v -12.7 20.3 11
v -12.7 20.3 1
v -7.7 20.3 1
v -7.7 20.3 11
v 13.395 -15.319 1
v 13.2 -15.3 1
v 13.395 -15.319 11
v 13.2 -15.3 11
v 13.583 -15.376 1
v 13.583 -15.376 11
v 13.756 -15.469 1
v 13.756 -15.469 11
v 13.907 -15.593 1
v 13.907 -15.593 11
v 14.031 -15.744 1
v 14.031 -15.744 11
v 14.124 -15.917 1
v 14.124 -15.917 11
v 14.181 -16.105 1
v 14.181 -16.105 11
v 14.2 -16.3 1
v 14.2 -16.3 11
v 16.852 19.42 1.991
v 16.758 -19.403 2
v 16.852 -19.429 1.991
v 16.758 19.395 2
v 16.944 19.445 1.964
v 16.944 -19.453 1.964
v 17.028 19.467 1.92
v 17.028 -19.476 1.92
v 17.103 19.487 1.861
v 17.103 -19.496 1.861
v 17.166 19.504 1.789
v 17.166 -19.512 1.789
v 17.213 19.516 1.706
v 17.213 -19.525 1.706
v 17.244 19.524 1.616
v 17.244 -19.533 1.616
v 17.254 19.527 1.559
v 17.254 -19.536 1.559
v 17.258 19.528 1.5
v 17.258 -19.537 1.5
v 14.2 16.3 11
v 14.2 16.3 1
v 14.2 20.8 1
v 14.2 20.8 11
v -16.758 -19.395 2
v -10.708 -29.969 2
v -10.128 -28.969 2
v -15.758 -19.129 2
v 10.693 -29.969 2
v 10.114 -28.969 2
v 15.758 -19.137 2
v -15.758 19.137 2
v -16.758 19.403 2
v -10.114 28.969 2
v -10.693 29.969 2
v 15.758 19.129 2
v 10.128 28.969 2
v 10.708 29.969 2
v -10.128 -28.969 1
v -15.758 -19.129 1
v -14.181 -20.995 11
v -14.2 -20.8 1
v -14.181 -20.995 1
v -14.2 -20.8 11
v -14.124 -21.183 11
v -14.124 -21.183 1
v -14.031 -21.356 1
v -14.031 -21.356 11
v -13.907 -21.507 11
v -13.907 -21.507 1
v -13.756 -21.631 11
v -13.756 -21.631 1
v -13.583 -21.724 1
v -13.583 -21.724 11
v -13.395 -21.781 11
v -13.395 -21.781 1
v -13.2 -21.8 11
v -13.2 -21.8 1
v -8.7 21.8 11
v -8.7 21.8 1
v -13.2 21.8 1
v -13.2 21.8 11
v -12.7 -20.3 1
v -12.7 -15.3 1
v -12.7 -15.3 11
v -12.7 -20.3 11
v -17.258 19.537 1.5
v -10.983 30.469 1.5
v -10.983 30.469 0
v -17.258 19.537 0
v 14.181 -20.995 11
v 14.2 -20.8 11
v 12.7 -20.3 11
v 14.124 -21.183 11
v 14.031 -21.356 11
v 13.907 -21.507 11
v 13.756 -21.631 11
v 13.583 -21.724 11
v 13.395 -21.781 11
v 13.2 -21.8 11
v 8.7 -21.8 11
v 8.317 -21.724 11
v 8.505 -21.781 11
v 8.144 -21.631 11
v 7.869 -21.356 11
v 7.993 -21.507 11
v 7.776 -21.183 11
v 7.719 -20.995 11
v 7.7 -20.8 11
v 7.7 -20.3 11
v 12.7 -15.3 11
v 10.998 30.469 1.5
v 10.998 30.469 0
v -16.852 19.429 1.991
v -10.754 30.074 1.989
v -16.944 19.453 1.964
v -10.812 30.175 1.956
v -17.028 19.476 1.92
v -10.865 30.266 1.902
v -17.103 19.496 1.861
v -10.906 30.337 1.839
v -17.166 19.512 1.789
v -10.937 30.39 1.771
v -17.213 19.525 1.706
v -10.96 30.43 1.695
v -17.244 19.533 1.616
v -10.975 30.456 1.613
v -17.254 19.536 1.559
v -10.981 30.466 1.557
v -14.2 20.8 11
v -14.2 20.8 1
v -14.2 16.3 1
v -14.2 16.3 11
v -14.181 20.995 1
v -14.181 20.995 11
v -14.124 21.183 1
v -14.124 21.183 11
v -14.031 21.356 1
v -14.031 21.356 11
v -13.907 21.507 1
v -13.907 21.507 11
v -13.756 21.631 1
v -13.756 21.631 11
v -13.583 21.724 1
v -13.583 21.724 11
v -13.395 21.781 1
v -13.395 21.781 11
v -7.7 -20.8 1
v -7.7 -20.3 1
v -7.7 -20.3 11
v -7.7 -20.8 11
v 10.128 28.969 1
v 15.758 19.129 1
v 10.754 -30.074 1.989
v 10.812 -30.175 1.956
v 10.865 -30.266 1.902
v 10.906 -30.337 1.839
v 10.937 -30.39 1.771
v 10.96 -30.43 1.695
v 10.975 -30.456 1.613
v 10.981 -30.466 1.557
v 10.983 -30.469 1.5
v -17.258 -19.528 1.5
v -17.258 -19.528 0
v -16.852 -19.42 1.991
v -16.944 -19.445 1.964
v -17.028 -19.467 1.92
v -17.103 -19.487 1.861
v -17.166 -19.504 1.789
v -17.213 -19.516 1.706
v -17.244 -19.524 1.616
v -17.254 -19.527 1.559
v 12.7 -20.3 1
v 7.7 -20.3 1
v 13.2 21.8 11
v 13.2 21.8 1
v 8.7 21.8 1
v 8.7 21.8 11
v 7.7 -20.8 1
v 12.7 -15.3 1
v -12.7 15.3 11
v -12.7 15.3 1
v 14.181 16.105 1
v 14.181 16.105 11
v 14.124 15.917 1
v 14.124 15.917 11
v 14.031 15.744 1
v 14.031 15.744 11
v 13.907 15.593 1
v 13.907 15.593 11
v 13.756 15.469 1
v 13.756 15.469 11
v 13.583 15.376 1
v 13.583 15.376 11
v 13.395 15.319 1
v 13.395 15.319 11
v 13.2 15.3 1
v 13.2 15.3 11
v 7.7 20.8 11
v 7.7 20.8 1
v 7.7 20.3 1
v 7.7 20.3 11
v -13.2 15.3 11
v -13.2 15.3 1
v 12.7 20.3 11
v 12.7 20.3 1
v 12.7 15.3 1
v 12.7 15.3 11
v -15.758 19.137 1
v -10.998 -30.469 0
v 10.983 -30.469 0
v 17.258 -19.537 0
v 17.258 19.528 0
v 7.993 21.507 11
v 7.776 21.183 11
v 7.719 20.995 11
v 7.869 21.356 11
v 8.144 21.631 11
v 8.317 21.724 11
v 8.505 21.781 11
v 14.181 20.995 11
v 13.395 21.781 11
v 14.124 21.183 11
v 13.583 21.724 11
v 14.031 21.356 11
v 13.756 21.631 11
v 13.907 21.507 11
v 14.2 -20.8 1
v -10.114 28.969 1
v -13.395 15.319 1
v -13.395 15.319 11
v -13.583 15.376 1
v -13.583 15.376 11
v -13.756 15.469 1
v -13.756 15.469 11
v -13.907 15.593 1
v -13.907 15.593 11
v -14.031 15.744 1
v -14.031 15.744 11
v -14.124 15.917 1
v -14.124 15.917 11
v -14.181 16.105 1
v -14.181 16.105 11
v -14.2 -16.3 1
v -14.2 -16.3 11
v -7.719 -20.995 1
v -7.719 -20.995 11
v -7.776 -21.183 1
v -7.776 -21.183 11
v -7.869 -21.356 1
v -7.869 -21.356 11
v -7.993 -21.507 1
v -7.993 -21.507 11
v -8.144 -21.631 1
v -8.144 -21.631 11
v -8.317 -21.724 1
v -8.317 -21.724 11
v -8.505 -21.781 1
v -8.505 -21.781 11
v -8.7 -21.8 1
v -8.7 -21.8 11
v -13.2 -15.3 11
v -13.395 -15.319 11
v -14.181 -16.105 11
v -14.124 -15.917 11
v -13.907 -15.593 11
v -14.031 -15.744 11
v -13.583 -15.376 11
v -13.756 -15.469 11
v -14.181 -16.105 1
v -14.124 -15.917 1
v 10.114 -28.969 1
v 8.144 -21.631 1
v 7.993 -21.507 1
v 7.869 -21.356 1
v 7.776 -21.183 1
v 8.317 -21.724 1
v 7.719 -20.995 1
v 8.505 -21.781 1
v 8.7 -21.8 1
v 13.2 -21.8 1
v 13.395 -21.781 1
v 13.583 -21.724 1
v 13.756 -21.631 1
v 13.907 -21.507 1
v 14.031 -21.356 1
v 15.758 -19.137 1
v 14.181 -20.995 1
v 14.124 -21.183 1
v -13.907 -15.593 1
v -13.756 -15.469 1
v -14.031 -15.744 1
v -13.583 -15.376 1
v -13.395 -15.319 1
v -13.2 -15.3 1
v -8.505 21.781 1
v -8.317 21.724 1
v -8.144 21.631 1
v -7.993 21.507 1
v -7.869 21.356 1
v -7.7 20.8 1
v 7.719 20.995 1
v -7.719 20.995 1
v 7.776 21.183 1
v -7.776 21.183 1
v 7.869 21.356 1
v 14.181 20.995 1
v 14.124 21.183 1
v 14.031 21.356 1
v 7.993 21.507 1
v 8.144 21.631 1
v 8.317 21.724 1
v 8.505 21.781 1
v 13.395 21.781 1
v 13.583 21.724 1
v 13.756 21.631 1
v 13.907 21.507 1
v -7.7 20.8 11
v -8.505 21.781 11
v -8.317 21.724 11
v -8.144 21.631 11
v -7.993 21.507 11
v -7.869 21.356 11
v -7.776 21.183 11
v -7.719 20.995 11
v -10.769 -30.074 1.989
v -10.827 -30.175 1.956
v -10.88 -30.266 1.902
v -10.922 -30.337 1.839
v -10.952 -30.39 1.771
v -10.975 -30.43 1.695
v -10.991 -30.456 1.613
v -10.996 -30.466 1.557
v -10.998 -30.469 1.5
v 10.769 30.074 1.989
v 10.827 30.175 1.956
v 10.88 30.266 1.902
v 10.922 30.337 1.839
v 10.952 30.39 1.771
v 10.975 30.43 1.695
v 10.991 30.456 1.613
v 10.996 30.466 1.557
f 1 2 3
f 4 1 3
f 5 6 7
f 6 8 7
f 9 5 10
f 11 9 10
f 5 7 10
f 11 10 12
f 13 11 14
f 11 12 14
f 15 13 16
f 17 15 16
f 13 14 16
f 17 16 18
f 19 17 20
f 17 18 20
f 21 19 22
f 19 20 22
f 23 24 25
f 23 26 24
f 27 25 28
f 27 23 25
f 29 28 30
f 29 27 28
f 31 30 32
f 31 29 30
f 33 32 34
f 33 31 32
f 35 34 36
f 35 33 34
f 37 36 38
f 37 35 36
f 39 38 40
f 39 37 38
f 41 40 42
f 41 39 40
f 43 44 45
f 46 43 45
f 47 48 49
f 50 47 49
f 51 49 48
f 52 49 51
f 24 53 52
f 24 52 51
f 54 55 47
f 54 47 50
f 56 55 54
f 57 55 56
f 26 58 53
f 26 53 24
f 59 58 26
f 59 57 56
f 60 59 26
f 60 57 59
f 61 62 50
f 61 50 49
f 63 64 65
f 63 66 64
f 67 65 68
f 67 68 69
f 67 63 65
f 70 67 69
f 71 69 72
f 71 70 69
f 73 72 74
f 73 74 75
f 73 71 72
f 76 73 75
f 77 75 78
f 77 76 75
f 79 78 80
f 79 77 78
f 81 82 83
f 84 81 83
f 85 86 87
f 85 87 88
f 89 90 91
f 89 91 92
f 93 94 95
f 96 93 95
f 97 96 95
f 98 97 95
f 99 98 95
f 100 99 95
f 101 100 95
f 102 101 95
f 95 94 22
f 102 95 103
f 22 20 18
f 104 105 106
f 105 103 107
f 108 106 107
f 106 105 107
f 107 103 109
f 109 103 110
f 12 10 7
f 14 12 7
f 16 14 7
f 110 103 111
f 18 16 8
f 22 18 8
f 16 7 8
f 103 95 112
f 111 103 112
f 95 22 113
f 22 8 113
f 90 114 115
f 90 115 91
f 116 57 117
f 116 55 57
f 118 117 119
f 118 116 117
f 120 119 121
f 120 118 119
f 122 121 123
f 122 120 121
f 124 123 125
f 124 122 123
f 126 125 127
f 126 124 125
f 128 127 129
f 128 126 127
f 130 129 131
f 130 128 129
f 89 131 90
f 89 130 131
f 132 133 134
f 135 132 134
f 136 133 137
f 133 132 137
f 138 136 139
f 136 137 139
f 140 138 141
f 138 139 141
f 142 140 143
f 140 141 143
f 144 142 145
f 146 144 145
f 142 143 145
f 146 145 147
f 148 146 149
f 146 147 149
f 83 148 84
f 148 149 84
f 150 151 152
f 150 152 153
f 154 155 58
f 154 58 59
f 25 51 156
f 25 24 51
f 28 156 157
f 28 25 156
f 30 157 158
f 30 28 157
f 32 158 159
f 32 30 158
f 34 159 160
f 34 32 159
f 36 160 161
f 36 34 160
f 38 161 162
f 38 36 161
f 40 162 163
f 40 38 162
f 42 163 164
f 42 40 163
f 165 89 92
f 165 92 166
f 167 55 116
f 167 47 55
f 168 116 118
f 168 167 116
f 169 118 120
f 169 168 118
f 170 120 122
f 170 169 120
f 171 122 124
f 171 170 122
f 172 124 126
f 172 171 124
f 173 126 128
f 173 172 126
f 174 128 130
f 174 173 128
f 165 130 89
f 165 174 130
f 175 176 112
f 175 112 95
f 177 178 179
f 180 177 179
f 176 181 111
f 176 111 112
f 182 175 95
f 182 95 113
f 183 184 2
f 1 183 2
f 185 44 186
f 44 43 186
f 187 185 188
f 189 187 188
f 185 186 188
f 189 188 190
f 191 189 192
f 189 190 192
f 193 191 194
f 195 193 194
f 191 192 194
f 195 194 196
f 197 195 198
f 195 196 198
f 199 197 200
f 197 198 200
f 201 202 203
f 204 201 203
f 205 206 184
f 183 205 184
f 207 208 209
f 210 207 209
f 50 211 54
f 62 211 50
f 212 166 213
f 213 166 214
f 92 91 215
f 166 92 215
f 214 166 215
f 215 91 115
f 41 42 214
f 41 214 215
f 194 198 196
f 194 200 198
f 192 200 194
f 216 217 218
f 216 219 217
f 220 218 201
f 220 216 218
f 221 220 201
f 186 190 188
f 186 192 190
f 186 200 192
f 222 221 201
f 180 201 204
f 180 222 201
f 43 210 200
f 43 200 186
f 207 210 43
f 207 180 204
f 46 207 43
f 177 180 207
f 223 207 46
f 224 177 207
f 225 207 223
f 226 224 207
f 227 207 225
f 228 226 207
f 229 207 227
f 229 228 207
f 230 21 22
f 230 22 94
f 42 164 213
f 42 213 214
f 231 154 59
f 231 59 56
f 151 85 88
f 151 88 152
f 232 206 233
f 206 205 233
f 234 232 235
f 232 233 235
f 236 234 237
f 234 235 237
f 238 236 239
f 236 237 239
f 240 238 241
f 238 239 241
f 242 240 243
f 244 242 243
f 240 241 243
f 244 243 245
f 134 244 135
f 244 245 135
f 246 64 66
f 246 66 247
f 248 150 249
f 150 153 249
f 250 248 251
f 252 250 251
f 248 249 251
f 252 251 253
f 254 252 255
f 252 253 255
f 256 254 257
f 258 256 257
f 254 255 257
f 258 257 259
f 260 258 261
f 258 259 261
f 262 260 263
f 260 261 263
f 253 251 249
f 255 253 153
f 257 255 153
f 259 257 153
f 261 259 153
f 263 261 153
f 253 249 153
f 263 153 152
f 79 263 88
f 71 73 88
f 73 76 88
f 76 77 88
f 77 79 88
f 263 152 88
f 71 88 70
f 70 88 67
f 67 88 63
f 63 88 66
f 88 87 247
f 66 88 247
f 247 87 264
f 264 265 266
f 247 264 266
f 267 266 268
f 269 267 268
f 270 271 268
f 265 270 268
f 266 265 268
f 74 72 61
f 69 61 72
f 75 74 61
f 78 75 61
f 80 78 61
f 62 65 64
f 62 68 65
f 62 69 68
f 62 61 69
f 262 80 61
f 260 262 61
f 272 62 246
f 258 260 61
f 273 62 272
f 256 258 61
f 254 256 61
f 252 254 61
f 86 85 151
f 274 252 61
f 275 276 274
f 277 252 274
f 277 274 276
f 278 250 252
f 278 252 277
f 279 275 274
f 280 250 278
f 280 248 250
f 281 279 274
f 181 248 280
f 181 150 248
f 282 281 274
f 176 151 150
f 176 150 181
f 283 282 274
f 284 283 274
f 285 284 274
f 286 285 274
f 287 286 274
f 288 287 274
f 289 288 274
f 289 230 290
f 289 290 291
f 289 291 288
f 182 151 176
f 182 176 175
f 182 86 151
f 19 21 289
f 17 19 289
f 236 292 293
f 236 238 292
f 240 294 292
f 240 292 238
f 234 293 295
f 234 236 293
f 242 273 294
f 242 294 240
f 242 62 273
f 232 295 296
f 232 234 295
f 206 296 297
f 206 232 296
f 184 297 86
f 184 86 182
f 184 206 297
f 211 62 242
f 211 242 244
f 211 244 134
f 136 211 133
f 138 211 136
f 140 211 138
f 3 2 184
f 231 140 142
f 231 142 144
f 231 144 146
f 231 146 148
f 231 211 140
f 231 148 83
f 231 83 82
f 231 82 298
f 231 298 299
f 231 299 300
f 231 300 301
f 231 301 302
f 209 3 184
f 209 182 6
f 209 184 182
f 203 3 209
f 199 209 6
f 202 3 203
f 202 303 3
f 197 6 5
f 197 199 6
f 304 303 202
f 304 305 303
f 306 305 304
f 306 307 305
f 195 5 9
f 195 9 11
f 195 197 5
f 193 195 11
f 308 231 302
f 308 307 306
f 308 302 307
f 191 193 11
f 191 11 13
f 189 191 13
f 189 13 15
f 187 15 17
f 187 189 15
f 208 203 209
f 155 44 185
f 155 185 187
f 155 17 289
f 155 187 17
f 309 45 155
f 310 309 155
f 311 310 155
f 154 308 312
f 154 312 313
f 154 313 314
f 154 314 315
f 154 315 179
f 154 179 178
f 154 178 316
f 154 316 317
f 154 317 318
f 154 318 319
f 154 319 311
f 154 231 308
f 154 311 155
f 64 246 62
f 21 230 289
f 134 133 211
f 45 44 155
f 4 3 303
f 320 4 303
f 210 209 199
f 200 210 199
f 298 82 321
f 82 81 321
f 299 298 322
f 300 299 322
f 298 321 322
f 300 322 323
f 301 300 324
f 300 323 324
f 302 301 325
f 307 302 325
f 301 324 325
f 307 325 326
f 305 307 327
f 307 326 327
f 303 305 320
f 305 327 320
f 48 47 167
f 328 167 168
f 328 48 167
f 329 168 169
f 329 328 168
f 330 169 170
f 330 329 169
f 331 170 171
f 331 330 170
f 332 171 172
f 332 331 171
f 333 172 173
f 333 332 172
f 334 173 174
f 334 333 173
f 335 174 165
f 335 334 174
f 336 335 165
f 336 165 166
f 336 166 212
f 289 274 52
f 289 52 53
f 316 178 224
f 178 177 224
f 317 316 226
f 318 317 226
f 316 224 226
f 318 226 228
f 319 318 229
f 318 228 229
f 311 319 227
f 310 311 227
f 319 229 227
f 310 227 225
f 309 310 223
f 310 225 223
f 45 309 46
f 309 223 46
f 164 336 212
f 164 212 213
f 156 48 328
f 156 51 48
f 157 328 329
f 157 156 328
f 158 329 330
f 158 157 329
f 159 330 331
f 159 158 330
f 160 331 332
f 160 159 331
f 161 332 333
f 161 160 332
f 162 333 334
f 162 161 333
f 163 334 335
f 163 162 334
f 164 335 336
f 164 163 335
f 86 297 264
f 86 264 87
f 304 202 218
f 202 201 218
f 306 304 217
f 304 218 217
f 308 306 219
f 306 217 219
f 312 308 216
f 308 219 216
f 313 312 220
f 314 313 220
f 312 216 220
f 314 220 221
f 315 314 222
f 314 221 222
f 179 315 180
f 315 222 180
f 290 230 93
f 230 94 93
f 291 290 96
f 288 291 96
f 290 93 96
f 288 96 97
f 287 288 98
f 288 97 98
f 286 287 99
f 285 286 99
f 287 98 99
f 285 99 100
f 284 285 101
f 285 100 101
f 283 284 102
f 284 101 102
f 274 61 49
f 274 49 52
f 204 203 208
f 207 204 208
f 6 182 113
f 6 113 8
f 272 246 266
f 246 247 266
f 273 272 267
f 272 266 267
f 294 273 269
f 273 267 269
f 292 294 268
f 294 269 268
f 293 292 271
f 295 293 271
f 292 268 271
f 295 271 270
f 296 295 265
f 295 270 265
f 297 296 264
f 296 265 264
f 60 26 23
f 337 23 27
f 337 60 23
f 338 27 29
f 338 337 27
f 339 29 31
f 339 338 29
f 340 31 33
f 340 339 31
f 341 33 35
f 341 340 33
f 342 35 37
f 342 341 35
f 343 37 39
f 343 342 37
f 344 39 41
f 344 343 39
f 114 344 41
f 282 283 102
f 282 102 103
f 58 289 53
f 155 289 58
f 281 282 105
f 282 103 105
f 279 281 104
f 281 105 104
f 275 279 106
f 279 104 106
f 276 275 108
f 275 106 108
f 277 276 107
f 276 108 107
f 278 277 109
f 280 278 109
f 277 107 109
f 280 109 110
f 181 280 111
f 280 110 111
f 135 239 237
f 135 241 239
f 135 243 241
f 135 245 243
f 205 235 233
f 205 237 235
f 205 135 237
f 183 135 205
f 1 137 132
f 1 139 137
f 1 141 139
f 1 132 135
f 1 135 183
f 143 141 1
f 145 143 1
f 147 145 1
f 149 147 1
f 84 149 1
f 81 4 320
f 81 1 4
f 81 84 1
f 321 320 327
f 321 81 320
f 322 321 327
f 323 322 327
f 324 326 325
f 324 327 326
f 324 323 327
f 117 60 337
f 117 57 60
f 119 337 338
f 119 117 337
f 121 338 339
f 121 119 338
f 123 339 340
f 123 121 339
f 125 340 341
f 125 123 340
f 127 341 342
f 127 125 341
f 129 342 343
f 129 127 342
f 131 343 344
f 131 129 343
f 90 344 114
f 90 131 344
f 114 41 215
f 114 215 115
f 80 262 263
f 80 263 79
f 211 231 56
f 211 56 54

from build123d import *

# Parameters (mm, degrees)
BOSS_EXTRUDE1_DEPTH = 1
BOSS_EXTRUDE2_DEPTH = 1
BOSS_EXTRUDE3_DEPTH = 10
CUT_EXTRUDE1_DEPTH  = 6.35
FILLET1_R           = 1
FILLET2_R           = 0.5


with BuildPart() as part:
    # Sketch1 → Boss-Extrude1 (new body)
    with BuildSketch(Plane.XY):
        Polygon((-18.007564672, 19.736677749), (-18.007564672, -19.727423866), (-11.433074418, -31.219203109), (11.416925582, -31.219203109), (18.007564672, -19.736677749), (18.007564672, 19.727423866), (11.433074418, 31.219203109), (-11.416925582, 31.219203109), align=None)
    extrude(amount=BOSS_EXTRUDE1_DEPTH)

    # Sketch2 → Boss-Extrude2 (add)
    with BuildSketch(Plane.XY.offset(1)):
        Polygon((-10.982642952, 30.469203109), (-17.257564672, 19.536735589), (-17.257564672, -19.528046249), (-10.99808756, -30.469203109), (10.982642952, -30.469203109), (17.257564672, -19.536735589), (17.257564672, 19.528046249), (10.99808756, 30.469203109), align=None)
        Polygon((-10.114077691, 28.969203109), (-15.757564672, 19.136851269), (-15.757564672, -19.129291014), (-10.128113844, -28.969203109), (10.114077691, -28.969203109), (15.757564672, -19.136851269), (15.757564672, 19.129291014), (10.128113844, 28.969203109), align=None, mode=Mode.SUBTRACT)
    extrude(amount=BOSS_EXTRUDE2_DEPTH)

    # Sketch3 → Boss-Extrude3 (add)
    with BuildSketch(Plane.XY.offset(1)):
        Polygon((-14.2, -21.8), (-14.2, -15.3), (-12.7, -15.3), (-12.7, -20.3), (-7.7, -20.3), (-7.7, -21.8), align=None)
        Polygon((-12.7, 20.3), (-7.7, 20.3), (-7.7, 21.8), (-14.2, 21.8), (-14.2, 15.3), (-12.7, 15.3), align=None)
        Polygon((12.7, -20.3), (12.7, -15.3), (14.2, -15.3), (14.2, -21.8), (7.7, -21.8), (7.7, -20.3), align=None)
        Polygon((12.7, 15.3), (14.2, 15.3), (14.2, 21.8), (7.7, 21.8), (7.7, 20.3), (12.7, 20.3), align=None)
    extrude(amount=BOSS_EXTRUDE3_DEPTH)

    # Sketch4 → Cut-Extrude1 (cut)
    with BuildSketch(Plane.XY.offset(1)):
        Polygon((13.897999946, 35.469203109), (-13.877860488, 35.469203109), (-22.257564672, 20.869683322), (-22.257564672, -20.857230366), (-13.897999946, -35.469203109), (13.877860488, -35.469203109), (22.257564672, -20.869683322), (22.257564672, 20.857230366), align=None)
        Polygon((10.99808756, 30.469203109), (-10.982642952, 30.469203109), (-17.257564672, 19.536735589), (-17.257564672, -19.528046249), (-10.99808756, -30.469203109), (10.982642952, -30.469203109), (17.257564672, -19.536735589), (17.257564672, 19.528046249), align=None, mode=Mode.SUBTRACT)
    extrude(amount=-CUT_EXTRUDE1_DEPTH, mode=Mode.SUBTRACT)

    # Fillet1
    fillet1_edges = [part.edges().sort_by_distance(p)[0] for p in [
        (-7.7, 21.8, 6),
        (-14.2, 21.8, 6),
        (-14.2, 15.3, 6),
        (7.7, -21.8, 6),
        (14.2, -21.8, 6),
        (14.2, -15.3, 6),
        (14.2, 15.3, 6),
        (14.2, 21.8, 6),
        (7.7, 21.8, 6),
        (-14.2, -15.3, 6),
        (-14.2, -21.8, 6),
        (-7.7, -21.8, 6),
    ]]
    fillet(fillet1_edges, radius=FILLET1_R)

    # Fillet2
    fillet2_edges = [part.edges().sort_by_distance(p)[0] for p in [
        (0.007722304, 30.469203109, 2),
        (-14.120103812, 25.002969349, 2),
        (-17.257564672, 0.00434467, 2),
        (-14.127826116, -24.998624679, 2),
        (-0.007722304, -30.469203109, 2),
        (14.120103812, -25.002969349, 2),
        (17.257564672, -0.00434467, 2),
        (14.127826116, 24.998624679, 2),
    ]]
    fillet(fillet2_edges, radius=FILLET2_R)


solid = part.part
